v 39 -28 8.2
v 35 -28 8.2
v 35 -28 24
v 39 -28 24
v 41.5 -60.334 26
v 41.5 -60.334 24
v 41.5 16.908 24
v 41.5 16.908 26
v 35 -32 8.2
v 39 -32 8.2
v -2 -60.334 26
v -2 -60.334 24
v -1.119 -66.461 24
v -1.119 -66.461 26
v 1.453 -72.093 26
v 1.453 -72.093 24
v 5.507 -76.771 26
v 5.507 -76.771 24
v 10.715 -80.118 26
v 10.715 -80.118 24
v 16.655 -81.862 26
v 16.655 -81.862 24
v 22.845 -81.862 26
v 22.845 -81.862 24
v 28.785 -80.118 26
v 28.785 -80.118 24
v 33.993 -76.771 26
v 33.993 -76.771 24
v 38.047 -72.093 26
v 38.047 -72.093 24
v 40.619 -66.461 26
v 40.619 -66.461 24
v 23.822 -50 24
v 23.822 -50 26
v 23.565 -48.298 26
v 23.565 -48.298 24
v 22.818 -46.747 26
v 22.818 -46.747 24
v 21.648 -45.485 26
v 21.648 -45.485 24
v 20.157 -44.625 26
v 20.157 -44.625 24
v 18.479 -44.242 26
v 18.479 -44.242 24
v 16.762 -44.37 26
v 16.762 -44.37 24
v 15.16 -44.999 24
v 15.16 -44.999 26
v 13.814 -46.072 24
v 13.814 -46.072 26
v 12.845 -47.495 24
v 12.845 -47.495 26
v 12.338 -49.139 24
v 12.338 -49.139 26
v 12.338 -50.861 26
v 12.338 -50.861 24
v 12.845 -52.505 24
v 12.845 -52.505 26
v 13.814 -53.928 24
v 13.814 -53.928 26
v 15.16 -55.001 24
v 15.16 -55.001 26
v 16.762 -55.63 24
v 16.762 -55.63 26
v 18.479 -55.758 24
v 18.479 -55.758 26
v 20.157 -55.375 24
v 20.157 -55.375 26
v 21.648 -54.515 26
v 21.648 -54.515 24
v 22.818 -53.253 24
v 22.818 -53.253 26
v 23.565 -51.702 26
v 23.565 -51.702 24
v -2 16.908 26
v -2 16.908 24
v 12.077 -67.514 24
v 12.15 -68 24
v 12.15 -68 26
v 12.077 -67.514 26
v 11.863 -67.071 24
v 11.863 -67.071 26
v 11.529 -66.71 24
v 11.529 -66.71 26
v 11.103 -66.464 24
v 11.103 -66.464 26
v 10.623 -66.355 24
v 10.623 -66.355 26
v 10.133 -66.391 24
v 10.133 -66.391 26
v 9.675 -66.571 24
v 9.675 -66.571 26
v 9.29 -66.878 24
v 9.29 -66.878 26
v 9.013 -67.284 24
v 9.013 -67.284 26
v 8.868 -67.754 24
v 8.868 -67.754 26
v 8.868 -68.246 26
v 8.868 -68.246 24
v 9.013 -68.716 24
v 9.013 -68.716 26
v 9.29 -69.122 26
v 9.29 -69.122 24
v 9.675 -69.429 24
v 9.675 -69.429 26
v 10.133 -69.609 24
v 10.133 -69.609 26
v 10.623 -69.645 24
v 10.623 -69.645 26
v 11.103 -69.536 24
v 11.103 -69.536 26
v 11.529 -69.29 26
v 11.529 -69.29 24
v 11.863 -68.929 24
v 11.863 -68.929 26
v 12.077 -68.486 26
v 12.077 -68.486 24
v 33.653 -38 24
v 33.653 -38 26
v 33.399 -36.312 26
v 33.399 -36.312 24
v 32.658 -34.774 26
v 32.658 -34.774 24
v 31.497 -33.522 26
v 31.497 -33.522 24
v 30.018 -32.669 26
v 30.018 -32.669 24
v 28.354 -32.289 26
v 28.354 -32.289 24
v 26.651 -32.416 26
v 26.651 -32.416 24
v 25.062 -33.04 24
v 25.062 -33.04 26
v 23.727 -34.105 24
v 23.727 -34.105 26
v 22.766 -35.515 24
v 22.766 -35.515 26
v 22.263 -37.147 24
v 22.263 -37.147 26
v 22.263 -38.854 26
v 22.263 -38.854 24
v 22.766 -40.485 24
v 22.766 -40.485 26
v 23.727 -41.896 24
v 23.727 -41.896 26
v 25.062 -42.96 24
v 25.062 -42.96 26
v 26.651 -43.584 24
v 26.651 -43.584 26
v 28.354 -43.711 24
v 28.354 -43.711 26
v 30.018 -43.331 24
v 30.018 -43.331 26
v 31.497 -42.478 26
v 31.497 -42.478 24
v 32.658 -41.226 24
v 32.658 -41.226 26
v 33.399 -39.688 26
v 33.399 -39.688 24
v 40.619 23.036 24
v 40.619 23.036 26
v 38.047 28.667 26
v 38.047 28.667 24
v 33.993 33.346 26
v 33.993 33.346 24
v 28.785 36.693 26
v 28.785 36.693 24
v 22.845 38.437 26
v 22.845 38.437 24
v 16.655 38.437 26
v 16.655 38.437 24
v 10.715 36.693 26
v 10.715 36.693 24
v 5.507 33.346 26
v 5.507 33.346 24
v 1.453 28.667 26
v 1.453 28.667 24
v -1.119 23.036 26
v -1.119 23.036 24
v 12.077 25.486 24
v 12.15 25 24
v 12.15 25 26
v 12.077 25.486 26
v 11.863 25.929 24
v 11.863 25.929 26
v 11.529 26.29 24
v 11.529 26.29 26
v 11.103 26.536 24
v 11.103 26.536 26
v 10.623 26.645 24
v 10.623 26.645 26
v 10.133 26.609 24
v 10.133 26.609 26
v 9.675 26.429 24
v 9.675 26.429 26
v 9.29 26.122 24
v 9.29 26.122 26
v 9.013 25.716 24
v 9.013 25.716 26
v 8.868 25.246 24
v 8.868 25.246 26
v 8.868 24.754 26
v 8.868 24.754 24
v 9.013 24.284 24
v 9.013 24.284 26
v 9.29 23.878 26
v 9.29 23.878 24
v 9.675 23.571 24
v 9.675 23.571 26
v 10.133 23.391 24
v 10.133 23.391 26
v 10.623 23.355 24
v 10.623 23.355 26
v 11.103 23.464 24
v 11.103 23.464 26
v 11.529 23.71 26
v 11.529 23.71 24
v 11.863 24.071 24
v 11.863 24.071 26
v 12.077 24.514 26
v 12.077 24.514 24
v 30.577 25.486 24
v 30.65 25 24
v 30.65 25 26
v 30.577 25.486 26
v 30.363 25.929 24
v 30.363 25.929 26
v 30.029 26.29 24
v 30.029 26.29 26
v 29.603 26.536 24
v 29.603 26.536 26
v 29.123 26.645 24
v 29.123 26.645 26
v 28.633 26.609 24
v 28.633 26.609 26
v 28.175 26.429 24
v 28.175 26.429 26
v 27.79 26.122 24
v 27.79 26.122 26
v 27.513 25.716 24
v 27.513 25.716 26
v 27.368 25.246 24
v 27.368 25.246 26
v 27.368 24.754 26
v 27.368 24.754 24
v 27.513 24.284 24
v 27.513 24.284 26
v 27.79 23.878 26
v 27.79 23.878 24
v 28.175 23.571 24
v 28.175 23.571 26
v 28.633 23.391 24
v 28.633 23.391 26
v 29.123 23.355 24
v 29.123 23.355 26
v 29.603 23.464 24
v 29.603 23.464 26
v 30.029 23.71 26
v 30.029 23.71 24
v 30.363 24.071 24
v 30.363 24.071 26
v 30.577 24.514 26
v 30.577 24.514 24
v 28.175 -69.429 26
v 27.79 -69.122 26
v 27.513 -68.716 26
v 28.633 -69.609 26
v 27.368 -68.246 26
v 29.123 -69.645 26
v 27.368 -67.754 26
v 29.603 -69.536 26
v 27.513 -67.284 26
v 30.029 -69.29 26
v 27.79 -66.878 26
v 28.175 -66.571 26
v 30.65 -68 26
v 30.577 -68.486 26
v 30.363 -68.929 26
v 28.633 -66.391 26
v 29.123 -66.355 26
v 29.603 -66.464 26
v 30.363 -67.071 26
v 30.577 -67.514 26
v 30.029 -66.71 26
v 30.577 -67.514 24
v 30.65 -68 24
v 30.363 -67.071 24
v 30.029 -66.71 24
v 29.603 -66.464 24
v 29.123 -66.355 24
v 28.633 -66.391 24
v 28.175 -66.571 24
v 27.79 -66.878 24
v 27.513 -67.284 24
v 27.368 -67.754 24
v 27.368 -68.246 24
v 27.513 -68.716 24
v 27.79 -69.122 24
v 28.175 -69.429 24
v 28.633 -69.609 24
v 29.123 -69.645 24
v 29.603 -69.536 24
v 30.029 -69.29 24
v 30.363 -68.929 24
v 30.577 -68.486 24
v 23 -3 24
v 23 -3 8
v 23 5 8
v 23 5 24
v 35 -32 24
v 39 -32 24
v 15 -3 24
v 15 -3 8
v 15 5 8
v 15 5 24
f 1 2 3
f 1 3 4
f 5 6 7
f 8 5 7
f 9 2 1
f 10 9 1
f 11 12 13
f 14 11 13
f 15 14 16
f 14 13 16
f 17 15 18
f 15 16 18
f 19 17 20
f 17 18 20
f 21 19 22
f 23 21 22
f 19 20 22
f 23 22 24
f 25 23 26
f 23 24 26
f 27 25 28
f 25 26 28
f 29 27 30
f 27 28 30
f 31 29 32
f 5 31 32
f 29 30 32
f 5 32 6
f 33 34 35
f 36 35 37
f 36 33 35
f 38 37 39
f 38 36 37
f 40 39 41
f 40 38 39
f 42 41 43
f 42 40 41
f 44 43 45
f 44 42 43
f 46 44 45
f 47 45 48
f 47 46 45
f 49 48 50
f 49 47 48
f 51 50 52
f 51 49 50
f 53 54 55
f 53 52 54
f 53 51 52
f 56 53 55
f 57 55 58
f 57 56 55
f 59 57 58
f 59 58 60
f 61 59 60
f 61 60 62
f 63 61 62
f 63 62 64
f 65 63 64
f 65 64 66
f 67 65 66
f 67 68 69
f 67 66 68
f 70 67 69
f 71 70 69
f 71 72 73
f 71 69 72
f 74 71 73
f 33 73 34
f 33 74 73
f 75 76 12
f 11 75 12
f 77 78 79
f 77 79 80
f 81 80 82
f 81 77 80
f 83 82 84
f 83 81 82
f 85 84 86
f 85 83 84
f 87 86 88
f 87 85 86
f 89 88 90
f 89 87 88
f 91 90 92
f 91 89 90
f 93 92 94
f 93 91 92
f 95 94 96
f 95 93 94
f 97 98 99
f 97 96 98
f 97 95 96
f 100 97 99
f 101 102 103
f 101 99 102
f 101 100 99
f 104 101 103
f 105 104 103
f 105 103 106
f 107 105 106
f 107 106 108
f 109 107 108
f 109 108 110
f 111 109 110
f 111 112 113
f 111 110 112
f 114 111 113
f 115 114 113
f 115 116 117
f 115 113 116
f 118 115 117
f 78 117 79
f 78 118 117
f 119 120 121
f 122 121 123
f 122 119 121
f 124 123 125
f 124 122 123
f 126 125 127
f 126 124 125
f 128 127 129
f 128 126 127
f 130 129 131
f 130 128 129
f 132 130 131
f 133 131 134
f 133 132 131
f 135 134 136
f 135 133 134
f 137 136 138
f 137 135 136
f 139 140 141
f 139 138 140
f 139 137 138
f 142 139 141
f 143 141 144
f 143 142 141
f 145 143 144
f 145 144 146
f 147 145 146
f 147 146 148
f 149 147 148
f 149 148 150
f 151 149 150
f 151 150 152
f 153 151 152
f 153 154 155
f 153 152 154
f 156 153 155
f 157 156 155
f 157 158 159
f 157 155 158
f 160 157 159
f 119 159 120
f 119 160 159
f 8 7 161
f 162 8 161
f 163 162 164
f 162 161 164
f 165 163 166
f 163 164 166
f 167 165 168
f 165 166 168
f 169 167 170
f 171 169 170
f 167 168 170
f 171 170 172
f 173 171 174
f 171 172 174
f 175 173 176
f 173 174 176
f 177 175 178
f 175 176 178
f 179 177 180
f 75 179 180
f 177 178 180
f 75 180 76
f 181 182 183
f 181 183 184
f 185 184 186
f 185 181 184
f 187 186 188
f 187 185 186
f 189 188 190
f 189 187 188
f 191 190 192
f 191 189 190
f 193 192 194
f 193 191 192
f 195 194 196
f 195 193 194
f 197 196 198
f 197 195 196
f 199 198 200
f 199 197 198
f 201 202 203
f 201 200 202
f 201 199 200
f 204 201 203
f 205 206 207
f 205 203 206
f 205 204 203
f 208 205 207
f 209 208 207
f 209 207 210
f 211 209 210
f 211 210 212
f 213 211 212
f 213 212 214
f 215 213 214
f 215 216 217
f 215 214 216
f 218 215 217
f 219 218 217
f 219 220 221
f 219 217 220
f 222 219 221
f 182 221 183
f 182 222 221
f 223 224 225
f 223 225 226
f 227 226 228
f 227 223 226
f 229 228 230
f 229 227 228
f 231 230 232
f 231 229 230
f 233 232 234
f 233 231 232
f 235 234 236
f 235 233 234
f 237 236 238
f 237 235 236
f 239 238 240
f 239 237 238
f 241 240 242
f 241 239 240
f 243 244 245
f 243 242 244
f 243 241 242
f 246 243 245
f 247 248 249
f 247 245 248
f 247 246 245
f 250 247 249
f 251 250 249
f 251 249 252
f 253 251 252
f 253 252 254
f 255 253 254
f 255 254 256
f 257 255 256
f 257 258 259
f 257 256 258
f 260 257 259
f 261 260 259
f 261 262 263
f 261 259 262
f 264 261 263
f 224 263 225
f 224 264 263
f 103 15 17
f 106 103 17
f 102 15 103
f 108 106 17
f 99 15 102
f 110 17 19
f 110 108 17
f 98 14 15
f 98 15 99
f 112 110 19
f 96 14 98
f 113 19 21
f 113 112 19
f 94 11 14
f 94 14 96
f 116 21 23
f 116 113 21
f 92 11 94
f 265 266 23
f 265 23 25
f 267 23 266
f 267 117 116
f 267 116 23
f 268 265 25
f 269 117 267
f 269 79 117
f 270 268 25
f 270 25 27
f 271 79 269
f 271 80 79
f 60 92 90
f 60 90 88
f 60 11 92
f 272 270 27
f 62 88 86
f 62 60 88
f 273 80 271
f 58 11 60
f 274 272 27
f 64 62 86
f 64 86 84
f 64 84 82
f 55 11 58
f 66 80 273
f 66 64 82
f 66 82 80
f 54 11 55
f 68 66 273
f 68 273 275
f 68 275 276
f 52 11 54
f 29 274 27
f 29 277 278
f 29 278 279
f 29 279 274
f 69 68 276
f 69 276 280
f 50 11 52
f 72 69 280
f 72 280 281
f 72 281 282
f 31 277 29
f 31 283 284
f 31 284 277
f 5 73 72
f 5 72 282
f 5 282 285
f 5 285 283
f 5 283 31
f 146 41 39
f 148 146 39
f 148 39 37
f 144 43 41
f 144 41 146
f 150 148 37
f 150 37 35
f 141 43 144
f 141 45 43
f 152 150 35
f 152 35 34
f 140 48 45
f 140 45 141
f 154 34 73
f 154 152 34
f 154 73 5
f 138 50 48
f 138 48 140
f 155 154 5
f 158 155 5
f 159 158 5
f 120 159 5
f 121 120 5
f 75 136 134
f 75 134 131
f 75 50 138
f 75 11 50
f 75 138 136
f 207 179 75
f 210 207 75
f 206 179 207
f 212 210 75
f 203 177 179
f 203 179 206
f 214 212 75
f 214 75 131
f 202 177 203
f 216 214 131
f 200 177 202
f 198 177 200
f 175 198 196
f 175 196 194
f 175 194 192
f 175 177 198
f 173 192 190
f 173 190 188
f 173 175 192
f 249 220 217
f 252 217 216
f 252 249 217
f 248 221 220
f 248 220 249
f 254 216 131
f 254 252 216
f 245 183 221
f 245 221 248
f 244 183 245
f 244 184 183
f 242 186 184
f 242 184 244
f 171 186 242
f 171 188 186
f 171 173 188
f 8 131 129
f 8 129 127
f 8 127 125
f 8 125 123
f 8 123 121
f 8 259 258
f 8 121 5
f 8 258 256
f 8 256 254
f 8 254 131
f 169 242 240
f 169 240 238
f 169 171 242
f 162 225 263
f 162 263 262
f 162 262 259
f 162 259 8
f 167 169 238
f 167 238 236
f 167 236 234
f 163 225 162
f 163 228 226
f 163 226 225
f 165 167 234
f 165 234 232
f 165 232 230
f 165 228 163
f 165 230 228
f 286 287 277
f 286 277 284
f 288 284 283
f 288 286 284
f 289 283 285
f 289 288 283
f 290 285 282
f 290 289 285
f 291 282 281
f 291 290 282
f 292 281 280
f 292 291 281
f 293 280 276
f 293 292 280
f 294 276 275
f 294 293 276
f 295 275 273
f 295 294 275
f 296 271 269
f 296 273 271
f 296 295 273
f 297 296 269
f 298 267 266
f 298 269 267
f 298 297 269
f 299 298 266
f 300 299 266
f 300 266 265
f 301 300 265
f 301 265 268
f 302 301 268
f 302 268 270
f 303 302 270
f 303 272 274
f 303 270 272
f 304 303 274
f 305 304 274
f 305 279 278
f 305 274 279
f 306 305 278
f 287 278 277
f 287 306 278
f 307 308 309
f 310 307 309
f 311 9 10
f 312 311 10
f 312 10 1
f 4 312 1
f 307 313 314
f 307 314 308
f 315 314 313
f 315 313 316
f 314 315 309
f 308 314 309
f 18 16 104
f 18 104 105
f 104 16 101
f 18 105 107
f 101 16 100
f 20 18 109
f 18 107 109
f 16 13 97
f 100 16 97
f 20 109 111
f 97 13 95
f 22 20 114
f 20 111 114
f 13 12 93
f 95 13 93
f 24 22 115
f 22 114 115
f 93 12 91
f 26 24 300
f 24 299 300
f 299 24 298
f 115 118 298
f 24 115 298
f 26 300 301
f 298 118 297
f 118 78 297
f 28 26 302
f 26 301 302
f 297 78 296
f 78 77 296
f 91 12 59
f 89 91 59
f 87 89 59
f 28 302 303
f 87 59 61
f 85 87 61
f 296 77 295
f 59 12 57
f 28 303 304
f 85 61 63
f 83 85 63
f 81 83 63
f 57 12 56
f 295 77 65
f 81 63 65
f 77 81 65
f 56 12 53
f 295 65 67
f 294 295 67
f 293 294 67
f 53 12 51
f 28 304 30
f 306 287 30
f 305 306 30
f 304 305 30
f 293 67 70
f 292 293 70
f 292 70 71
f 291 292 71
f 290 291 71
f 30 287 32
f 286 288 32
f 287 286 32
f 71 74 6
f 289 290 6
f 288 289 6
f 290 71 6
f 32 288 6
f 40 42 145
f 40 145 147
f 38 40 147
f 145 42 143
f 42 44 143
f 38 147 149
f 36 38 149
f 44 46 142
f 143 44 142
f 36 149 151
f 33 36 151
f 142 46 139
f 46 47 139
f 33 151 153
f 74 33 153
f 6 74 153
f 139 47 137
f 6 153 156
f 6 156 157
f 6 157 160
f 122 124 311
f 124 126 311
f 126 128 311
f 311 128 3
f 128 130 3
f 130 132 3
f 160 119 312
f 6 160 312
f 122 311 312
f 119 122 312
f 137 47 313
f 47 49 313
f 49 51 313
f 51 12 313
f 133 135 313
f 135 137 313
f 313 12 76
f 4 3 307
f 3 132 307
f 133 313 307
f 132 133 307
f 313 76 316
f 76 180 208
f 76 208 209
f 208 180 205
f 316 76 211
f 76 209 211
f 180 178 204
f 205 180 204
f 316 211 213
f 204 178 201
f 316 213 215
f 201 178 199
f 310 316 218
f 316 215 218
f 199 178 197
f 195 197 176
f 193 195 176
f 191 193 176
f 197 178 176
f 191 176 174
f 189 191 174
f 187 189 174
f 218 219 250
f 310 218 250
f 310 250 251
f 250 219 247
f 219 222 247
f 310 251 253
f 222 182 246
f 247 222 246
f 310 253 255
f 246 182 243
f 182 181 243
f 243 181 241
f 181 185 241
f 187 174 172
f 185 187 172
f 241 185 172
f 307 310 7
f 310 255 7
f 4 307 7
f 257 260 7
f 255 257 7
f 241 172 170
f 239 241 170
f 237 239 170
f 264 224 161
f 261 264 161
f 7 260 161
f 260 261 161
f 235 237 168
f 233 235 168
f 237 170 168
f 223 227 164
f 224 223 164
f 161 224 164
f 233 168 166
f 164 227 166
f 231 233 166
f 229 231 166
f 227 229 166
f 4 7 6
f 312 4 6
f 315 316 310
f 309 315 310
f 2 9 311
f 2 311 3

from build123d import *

# Parameters (mm, degrees)
BOX026_W          = 4
BOX026_H          = 4
BOX026_DEPTH      = 15.8
BOX032_W          = 8
BOX032_H          = 8
BOX032_DEPTH      = 16
CYLINDER007_R     = 1.65
CYLINDER007_DEPTH = 6
SKETCH002_R       = 5.774373
SKETCH002_R_2     = 5.727235
EXTRUDE002_DEPTH  = 5
EXTRUDE004_DEPTH  = 2


with BuildPart() as spacer002:
    # Box026 → Box026 (new body)
    with BuildSketch(Plane(origin=(35, -32, 8.2), x_dir=(1, 0, 0), z_dir=(0, 0, 1))):
        with Locations((2, 2)):
            Rectangle(BOX026_W, BOX026_H)
    extrude(amount=BOX026_DEPTH)


with BuildPart() as spacer003:
    # Box032 → Box032 (new body)
    with BuildSketch(Plane(origin=(15, -3, 8), x_dir=(1, 0, 0), z_dir=(0, 0, 1))):
        with Locations((4, 4)):
            Rectangle(BOX032_W, BOX032_H)
    extrude(amount=BOX032_DEPTH)


with BuildPart() as hole006:
    # Cylinder007 → Cylinder007 (new body)
    with BuildSketch(Plane(origin=(10.5, 25, 23), x_dir=(1, 0, 0), z_dir=(0, 0, 1))):
        Circle(CYLINDER007_R)
    extrude(amount=CYLINDER007_DEPTH)


with BuildPart() as hole007:
    # Clone014 base: copy of hole006
    add(hole006.part)


with BuildPart() as hole007_1:
    # Clone014 placement: moved
    add(hole007.part.moved(Location((18.5, 0, 0))))


with BuildPart() as hole008:
    # Clone015 base: copy of hole007
    add(hole007_1.part)


with BuildPart() as hole008_1:
    # Clone015 placement: moved
    add(hole008.part.moved(Location((-18.5, -93, 0))))


with BuildPart() as hole009:
    # Clone016 base: copy of hole008
    add(hole008_1.part)


with BuildPart() as hole009_1:
    # Clone016 placement: moved
    add(hole009.part.moved(Location((18.5, 0, 0))))


with BuildPart() as knobholes001:
    # Sketch002 → Extrude002 (new body)
    with BuildSketch(Plane(origin=(11, -50, 24), x_dir=(1, 0, 0), z_dir=(0, 0, 1))):
        with Locations((7.047384, 0)):
            Circle(SKETCH002_R)
        with Locations((16.925785, 11.999866)):
            Circle(SKETCH002_R_2)
    extrude(amount=EXTRUDE002_DEPTH)


with BuildPart() as fusion005:
    # Fusion005 base: copy of hole006
    add(hole006.part)

    # Fusion005: union hole007, hole008, hole009, knobHoles001
    add(hole007_1.part)
    add(hole008_1.part)
    add(hole009_1.part)
    add(knobholes001.part)


with BuildPart() as lid003:
    # Clone2D → Extrude004 (new body)
    with BuildSketch(Plane(origin=(0, -60, 24), x_dir=(1, 0, 0), z_dir=(0, 0, 1))):
        with BuildLine():
            ThreePointArc((41.5, 76.908478), (19.75, 98.658478), (-2, 76.908478))
            Line((-2, 76.908478), (-2, -0.333569))
            ThreePointArc((-2, -0.333569), (19.75, -22.083569), (41.5, -0.333569))
            Line((41.5, -0.333569), (41.5, 76.908478))
        make_face()
    extrude(amount=EXTRUDE004_DEPTH)

    # Cut004: cut Fusion005
    add(fusion005.part, mode=Mode.SUBTRACT)

    # Fusion006: union spacer002, spacer003
    add(spacer002.part)
    add(spacer003.part)


solid = lid003.part
